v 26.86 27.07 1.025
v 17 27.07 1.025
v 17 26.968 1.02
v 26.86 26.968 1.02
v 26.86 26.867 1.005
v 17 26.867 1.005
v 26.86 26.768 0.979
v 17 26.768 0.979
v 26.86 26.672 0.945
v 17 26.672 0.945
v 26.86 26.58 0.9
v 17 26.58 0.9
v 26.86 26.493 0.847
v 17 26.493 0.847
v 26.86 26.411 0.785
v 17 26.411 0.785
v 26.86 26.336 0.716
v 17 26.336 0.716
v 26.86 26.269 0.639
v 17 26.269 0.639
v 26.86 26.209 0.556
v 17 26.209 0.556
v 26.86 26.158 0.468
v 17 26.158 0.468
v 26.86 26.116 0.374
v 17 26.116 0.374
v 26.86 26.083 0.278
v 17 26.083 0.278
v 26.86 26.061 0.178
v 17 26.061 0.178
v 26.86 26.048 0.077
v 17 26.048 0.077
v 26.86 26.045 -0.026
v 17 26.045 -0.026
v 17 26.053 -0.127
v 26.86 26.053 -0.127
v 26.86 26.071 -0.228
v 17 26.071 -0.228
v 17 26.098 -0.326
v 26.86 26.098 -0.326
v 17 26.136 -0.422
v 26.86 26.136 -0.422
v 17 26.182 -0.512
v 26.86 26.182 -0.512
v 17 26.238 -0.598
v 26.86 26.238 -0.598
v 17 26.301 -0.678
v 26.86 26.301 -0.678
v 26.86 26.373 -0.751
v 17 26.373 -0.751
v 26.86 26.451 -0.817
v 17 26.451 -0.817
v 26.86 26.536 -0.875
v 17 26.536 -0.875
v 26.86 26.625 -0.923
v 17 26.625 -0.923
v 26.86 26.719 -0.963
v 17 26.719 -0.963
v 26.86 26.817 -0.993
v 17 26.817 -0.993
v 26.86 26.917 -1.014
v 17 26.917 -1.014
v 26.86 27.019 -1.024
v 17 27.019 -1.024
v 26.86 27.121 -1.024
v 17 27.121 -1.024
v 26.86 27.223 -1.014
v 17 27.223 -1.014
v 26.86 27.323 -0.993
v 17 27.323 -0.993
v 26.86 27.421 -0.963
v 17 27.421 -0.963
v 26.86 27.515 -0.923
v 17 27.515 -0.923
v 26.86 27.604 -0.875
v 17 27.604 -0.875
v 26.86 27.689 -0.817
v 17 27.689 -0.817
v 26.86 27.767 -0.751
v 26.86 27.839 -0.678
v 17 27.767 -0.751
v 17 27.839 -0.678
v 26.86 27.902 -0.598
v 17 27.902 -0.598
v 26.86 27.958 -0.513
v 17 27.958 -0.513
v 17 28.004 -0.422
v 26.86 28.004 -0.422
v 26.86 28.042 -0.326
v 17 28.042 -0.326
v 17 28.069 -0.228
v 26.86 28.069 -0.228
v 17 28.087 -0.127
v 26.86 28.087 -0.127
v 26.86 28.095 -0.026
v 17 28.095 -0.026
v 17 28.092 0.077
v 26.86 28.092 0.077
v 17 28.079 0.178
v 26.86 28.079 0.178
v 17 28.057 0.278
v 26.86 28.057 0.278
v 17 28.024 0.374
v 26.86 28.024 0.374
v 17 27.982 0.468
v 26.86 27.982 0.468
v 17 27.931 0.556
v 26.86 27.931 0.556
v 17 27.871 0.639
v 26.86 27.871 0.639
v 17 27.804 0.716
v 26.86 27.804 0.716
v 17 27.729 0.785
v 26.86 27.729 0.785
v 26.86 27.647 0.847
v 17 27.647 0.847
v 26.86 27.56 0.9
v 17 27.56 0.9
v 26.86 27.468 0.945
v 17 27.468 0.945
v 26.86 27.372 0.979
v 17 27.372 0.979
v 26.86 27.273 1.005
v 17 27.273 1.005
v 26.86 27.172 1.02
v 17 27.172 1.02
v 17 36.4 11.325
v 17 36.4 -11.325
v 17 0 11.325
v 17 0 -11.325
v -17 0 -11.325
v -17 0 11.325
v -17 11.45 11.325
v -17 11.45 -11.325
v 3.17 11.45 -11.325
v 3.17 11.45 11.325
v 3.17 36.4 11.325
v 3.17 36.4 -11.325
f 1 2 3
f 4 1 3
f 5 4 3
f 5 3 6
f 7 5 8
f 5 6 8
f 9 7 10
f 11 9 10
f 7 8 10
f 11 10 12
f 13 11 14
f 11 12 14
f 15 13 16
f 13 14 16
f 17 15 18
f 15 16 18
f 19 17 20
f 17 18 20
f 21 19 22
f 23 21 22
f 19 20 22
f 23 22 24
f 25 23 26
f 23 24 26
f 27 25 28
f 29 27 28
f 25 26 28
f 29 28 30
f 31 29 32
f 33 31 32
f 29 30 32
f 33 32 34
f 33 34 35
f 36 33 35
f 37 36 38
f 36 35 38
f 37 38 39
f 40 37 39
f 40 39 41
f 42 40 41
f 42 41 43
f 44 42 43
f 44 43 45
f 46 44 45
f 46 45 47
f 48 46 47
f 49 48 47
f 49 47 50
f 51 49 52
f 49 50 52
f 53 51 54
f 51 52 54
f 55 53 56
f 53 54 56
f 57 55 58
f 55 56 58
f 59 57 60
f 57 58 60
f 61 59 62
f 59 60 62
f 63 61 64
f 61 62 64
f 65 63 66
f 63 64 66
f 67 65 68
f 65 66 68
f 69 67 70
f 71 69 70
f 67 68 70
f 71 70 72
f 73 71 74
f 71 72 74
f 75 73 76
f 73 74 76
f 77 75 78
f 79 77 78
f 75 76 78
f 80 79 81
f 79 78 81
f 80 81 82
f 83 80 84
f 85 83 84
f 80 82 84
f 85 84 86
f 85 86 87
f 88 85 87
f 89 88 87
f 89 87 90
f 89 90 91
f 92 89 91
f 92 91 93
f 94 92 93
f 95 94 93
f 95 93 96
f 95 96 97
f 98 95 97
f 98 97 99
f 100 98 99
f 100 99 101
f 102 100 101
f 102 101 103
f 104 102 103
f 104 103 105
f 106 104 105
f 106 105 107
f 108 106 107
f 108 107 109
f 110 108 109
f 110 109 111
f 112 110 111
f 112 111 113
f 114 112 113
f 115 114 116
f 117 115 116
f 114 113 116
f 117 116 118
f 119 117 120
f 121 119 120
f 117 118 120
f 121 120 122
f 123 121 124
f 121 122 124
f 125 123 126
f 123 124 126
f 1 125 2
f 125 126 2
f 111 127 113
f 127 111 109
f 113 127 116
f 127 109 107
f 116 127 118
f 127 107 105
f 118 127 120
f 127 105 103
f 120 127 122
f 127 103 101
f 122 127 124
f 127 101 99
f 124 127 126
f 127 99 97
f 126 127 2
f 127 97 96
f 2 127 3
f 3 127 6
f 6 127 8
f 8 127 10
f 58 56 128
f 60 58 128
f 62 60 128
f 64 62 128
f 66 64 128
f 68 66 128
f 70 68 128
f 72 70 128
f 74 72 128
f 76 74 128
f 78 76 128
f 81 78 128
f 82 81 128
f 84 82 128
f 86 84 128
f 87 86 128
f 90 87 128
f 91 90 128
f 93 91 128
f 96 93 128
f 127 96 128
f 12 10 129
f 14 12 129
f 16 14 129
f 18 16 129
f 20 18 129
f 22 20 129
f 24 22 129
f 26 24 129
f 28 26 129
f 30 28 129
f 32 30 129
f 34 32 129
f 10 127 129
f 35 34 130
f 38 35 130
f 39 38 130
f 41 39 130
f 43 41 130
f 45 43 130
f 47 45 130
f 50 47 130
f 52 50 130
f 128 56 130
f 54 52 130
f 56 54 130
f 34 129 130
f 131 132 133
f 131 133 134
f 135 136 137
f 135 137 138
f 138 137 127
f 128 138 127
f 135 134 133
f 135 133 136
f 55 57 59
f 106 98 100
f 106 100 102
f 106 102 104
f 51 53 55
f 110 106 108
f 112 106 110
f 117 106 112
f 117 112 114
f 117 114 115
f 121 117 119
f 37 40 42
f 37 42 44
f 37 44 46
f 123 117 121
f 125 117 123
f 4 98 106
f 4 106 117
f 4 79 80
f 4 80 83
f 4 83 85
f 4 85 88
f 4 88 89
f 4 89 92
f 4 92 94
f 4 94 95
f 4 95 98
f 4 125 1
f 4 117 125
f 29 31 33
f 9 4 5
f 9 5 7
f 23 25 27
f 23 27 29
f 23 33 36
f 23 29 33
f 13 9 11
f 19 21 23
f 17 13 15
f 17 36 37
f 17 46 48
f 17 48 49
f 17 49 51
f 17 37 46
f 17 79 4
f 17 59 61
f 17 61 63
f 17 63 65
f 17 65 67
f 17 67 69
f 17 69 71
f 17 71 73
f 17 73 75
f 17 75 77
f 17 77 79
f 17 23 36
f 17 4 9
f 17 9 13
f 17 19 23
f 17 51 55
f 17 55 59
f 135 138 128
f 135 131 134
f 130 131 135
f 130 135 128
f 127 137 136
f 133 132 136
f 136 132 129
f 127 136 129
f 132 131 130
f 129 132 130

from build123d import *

# Parameters (mm, degrees)
SKETCH1_W           = 34
SKETCH1_H           = 22.65
BOSS_EXTRUDE1_DEPTH = 11.45
SKETCH2_W           = 13.83
SKETCH2_H           = 22.65
BOSS_EXTRUDE2_DEPTH = 24.95
SKETCH5_R           = 1.025
BOSS_EXTRUDE3_DEPTH = 9.86


with BuildPart() as part:
    # Sketch1 → Boss-Extrude1 (new body)
    with BuildSketch(Plane(origin=(0, 0, 0), x_dir=(1, 0, 0), z_dir=(0, 1, 0))):
        Rectangle(SKETCH1_W, SKETCH1_H)
    extrude(amount=BOSS_EXTRUDE1_DEPTH)

    # Sketch2 → Boss-Extrude2 (add)
    with BuildSketch(Plane(origin=(0, 11.45, 0), x_dir=(1, 0, 0), z_dir=(0, 1, 0))):
        with Locations((10.085, 0)):
            Rectangle(SKETCH2_W, SKETCH2_H)
    extrude(amount=BOSS_EXTRUDE2_DEPTH)

    # Sketch5 → Boss-Extrude3 (add)
    with BuildSketch(Plane(origin=(17, 0, 0), x_dir=(0, 0, -1), z_dir=(1, 0, 0))):
        with Locations(Location((0, 27.07, 0), (0, 0, 180))):
            Circle(SKETCH5_R)
    extrude(amount=BOSS_EXTRUDE3_DEPTH)


solid = part.part
